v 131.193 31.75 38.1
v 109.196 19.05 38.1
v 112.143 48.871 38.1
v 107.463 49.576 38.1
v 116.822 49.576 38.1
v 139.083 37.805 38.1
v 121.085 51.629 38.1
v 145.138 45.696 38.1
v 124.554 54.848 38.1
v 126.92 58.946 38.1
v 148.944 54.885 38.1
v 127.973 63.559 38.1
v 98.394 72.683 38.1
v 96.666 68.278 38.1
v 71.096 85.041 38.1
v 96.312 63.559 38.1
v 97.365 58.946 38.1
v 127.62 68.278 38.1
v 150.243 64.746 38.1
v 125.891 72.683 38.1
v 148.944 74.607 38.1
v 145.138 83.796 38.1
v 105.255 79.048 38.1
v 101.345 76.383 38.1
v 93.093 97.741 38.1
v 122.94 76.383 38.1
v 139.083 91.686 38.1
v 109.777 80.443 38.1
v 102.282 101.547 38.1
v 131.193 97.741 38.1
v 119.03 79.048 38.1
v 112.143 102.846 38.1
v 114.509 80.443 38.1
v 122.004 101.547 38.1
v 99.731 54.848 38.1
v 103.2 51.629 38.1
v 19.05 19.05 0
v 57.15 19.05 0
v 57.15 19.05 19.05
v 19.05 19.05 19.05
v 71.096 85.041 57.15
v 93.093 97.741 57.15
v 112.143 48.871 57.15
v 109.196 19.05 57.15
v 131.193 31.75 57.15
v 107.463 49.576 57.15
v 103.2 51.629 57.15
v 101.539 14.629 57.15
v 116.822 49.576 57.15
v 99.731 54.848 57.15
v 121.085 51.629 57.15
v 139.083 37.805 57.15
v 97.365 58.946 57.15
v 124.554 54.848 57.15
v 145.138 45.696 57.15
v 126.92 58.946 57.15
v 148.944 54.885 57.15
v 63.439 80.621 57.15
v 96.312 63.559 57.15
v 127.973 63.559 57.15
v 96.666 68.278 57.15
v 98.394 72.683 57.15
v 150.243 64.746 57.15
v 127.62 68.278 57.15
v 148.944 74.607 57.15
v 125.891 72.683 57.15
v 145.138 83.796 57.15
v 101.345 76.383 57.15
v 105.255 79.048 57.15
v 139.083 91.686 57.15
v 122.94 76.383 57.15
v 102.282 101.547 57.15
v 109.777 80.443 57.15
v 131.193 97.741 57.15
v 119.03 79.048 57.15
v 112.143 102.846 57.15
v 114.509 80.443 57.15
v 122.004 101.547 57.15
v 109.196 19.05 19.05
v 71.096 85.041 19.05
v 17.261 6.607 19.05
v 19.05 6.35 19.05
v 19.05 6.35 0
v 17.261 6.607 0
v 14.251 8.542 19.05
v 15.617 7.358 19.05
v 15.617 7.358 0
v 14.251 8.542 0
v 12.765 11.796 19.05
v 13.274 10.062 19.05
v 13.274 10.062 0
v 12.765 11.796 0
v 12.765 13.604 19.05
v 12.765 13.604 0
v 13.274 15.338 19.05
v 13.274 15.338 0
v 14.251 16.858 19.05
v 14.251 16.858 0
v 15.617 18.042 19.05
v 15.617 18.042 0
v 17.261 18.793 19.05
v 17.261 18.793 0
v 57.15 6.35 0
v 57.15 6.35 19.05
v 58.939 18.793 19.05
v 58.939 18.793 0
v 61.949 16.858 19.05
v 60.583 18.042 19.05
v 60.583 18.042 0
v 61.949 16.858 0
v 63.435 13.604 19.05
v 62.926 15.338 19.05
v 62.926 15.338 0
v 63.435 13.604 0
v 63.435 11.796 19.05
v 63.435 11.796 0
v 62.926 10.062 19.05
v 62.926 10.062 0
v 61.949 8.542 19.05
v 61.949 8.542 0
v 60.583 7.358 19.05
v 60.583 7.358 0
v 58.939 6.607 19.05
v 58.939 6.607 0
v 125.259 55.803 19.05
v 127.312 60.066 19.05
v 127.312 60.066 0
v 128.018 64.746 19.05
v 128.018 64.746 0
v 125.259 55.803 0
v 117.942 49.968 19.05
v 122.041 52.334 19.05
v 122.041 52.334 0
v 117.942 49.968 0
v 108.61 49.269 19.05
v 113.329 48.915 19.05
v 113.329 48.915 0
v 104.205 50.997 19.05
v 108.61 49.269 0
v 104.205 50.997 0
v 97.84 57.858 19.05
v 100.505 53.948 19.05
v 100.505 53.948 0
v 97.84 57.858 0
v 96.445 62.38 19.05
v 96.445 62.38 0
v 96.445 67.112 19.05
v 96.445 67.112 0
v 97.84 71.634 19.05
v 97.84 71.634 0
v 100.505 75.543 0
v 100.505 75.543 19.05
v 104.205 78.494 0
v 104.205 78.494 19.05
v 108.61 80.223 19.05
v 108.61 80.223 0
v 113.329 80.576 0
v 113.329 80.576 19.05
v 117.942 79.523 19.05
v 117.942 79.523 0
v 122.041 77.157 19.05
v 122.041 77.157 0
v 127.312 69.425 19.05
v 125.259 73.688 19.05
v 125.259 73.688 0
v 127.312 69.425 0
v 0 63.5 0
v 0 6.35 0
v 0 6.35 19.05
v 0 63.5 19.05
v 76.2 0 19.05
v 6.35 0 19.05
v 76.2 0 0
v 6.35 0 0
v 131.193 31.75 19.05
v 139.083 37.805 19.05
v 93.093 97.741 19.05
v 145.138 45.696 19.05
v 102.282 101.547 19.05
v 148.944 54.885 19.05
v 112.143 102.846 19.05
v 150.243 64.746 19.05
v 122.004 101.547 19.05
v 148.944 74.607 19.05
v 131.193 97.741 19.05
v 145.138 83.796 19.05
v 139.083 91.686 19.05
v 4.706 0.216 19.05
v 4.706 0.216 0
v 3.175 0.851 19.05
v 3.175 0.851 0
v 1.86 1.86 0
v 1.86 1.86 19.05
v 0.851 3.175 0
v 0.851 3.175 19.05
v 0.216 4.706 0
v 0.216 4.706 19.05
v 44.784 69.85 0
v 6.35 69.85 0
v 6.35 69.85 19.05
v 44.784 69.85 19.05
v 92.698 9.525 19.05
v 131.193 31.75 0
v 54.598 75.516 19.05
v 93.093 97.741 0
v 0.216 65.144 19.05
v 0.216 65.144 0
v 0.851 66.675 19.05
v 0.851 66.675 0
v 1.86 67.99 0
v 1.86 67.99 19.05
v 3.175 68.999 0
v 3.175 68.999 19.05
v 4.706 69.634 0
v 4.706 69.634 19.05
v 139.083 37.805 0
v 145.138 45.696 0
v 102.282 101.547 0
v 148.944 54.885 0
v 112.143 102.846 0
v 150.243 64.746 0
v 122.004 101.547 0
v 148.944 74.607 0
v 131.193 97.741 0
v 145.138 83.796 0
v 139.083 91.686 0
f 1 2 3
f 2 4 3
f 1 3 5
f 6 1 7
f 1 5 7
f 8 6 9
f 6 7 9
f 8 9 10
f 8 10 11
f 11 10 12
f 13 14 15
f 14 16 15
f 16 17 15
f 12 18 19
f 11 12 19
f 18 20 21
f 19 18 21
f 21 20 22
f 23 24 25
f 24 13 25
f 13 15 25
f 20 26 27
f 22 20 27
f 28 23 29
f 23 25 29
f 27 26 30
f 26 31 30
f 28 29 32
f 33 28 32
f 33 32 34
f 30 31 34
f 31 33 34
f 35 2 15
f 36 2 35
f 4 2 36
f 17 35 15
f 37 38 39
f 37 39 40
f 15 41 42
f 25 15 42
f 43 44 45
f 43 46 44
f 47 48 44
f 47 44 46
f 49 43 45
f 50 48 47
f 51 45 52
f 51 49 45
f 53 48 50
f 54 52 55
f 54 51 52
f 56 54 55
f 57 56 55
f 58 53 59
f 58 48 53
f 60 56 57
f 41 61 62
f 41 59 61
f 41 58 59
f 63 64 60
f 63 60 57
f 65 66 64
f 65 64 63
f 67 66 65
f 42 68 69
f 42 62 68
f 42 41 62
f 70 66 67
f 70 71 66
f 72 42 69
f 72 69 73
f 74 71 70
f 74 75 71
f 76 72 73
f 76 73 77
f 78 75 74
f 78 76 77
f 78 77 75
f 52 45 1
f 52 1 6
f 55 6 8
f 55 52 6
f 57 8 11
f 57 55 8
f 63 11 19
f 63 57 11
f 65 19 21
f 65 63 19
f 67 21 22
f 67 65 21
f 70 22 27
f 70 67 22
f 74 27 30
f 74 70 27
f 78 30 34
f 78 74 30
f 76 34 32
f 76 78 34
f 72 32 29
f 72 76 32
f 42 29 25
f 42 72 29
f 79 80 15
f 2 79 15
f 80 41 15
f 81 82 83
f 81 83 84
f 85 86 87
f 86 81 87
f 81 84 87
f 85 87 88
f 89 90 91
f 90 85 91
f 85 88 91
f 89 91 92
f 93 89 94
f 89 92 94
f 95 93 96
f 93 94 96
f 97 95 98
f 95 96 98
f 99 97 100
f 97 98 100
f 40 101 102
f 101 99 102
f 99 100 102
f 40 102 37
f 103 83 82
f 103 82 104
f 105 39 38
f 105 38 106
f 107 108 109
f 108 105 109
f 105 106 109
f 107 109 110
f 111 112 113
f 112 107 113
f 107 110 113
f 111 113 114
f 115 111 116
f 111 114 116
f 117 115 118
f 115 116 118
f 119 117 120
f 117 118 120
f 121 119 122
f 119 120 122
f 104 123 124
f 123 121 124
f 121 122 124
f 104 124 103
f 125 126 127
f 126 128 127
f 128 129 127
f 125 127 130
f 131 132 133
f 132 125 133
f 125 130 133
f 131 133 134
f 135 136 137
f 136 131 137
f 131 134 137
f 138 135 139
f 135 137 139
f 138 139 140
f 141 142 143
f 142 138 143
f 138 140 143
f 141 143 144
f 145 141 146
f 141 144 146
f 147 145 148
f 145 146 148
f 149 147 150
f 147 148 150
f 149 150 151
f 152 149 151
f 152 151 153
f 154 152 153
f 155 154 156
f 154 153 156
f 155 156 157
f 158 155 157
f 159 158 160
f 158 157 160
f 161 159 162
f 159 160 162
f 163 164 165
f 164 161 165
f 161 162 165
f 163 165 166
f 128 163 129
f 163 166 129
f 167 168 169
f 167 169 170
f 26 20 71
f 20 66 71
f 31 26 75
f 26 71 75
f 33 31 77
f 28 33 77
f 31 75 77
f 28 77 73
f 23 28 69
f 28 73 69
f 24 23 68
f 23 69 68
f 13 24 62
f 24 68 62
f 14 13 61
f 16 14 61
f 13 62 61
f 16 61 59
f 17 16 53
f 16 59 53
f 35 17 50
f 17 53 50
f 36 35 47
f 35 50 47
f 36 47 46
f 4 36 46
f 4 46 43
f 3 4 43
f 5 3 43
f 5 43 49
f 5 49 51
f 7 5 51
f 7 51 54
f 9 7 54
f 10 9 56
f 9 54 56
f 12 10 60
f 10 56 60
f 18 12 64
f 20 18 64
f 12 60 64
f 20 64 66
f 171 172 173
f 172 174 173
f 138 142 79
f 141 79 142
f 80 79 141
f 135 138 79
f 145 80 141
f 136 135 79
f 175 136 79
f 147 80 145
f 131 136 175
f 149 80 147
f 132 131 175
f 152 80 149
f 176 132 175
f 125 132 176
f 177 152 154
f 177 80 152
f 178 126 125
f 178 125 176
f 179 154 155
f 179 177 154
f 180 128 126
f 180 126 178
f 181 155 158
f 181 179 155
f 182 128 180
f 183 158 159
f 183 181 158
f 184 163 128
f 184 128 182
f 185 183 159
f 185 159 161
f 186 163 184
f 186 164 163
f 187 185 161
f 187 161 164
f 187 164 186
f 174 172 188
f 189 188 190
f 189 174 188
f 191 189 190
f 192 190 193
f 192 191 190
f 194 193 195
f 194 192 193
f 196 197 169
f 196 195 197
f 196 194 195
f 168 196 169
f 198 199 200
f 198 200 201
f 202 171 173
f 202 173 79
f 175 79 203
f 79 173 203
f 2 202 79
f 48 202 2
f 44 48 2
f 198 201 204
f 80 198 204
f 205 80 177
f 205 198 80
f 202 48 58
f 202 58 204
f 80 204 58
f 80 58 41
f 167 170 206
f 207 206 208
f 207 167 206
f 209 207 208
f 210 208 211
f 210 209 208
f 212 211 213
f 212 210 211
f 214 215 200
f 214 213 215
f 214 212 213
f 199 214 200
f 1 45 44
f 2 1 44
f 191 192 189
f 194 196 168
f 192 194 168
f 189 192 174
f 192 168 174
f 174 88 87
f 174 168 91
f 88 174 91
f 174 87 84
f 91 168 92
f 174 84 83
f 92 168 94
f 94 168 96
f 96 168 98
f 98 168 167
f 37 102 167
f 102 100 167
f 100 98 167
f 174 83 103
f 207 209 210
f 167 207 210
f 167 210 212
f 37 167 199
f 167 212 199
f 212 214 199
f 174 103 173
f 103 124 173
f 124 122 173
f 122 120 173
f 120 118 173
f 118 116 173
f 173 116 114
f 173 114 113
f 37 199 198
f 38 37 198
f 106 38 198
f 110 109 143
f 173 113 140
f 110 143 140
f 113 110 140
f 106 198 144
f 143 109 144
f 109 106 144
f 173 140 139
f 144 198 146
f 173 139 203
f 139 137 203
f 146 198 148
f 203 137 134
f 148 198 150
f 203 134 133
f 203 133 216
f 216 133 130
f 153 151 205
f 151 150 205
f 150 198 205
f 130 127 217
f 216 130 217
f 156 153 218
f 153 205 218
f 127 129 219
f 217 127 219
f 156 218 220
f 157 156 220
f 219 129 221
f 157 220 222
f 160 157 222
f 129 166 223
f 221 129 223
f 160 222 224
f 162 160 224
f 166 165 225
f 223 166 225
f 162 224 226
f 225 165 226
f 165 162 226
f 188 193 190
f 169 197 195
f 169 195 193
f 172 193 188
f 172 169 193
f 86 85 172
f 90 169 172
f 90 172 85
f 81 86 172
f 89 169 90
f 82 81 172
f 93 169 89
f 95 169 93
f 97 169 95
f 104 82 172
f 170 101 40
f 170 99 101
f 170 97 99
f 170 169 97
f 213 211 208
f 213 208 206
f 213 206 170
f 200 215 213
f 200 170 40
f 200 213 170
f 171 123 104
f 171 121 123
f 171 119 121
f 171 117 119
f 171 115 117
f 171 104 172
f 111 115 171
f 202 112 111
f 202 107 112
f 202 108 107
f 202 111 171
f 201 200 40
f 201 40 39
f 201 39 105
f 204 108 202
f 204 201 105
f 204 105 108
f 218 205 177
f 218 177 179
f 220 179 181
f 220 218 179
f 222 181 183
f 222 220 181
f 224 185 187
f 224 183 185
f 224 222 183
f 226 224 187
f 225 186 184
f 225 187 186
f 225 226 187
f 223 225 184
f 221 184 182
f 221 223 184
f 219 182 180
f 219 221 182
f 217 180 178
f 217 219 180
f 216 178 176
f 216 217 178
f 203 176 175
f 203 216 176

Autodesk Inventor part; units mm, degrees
ref_plane "YZ Plane" through (0, 0, 0) normal (1, 0, 0) x (0, 1, 0)
ref_plane "XZ Plane" through (0, 0, 0) normal (0, 1, 0) x (-1, 0, 0)
ref_plane "XY Plane" through (0, 0, 0) normal (0, 0, 1) x (1, 0, 0)
sketch "Sketch1" plane through (0, 0, 0) normal (0, 0, 1) x (1, 0, 0)
  line L0 (6.35, 0) -> (76.2, 0)
  line L1 (76.2, 0) -> (131.1926, 31.75)
  line L2 (0, 6.35) -> (0, 63.5)
  line L3 (44.7837, 69.85) -> (93.0926, 97.7411)
  arc A0 (131.1926, 31.75) -> (93.0926, 97.7411) centre (112.1426, 64.7456) ccw
  line L4 (6.35, 69.85) -> (44.7837, 69.85)
  circle A1 centre (112.1426, 64.7456) radius 15.875
  arc A2 (6.35, 69.85) -> (0, 63.5) centre (6.35, 63.5) ccw
  arc A3 (0, 6.35) -> (6.35, 0) centre (6.35, 6.35) ccw
  line L5 (19.05, 12.7) -> (57.15, 12.7) construction
  line L6 (19.05, 6.35) -> (57.15, 6.35)
  line L7 (57.15, 19.05) -> (19.05, 19.05)
  arc A4 (19.05, 19.05) -> (19.05, 6.35) centre (19.05, 12.7) ccw
  arc A5 (57.15, 6.35) -> (57.15, 19.05) centre (57.15, 12.7) ccw
  point P0 (0, 0)
  point P1 (0, 69.85)
  point P2 (38.1, 12.7)
  dimension "d0" = 76.2
  dimension "d1" = 69.85
  dimension "d2" = 30
  dimension "d3" = 38.1
  dimension "d4" = 63.5
  dimension "d5" = 31.75
  dimension "d6" = 6.35
  dimension "d7" = 38.1
  dimension "d8" = 12.7
  dimension "d9" = 12.7
  dimension "d10" = 19.05
extrude "Extrusion1" add sketch "Sketch1" along normal blind 19.05
sketch "Sketch2" plane through (131.1926, 31.75, 0) normal (0.5, -0.866, 0) x (0.866, 0.5, 0)
  line L0 (-63.5, 19.05) -> (0, 19.05) projected
  line L1 (0, 0) -> (-63.5, 0) projected
  line L2 (-25.4, 19.05) -> (-25.4, 57.15)
  line L3 (-25.4, 57.15) -> (-34.2411, 57.15)
  line L4 (-34.2411, 57.15) -> (-44.45, 19.05)
  point P0 (-129.4911, 0)
  dimension "d16" = 57.15
  dimension "d17" = 75
  dimension "d18" = 19.05
  dimension "d19" = 38.1
extrude "Extrusion2" add sketch "Sketch2" against normal blind 76.2
sketch "Sketch3" plane through (101.5389, 14.6294, 57.15) normal (0, 0, 1) x (0.866, 0.5, 0)
  arc A0 (34.2411, 0) -> (34.2411, 76.2) centre (34.2411, 38.1) ccw projected
  circle A1 centre (34.2411, 38.1) radius 15.875
  arc A2 (34.2411, 0) -> (34.2411, 76.2) centre (34.2411, 38.1) ccw
  line L0 (8.8411, 76.2) -> (34.2411, 76.2)
  line L1 (34.2411, 0) -> (-29.2589, 0) projected
  line L2 (8.8411, 0) -> (34.2411, 0)
  line L3 (8.8411, 76.2) -> (8.8411, 0)
  point P0 (-95.25, 38.1)
  dimension "d25" = 31.75
  dimension "d26" = 76.2
extrude "Extrusion3" add sketch "Sketch3" against normal blind 19.05
properties part number "HW 7 Part 2" material "Steel, Carbon"
